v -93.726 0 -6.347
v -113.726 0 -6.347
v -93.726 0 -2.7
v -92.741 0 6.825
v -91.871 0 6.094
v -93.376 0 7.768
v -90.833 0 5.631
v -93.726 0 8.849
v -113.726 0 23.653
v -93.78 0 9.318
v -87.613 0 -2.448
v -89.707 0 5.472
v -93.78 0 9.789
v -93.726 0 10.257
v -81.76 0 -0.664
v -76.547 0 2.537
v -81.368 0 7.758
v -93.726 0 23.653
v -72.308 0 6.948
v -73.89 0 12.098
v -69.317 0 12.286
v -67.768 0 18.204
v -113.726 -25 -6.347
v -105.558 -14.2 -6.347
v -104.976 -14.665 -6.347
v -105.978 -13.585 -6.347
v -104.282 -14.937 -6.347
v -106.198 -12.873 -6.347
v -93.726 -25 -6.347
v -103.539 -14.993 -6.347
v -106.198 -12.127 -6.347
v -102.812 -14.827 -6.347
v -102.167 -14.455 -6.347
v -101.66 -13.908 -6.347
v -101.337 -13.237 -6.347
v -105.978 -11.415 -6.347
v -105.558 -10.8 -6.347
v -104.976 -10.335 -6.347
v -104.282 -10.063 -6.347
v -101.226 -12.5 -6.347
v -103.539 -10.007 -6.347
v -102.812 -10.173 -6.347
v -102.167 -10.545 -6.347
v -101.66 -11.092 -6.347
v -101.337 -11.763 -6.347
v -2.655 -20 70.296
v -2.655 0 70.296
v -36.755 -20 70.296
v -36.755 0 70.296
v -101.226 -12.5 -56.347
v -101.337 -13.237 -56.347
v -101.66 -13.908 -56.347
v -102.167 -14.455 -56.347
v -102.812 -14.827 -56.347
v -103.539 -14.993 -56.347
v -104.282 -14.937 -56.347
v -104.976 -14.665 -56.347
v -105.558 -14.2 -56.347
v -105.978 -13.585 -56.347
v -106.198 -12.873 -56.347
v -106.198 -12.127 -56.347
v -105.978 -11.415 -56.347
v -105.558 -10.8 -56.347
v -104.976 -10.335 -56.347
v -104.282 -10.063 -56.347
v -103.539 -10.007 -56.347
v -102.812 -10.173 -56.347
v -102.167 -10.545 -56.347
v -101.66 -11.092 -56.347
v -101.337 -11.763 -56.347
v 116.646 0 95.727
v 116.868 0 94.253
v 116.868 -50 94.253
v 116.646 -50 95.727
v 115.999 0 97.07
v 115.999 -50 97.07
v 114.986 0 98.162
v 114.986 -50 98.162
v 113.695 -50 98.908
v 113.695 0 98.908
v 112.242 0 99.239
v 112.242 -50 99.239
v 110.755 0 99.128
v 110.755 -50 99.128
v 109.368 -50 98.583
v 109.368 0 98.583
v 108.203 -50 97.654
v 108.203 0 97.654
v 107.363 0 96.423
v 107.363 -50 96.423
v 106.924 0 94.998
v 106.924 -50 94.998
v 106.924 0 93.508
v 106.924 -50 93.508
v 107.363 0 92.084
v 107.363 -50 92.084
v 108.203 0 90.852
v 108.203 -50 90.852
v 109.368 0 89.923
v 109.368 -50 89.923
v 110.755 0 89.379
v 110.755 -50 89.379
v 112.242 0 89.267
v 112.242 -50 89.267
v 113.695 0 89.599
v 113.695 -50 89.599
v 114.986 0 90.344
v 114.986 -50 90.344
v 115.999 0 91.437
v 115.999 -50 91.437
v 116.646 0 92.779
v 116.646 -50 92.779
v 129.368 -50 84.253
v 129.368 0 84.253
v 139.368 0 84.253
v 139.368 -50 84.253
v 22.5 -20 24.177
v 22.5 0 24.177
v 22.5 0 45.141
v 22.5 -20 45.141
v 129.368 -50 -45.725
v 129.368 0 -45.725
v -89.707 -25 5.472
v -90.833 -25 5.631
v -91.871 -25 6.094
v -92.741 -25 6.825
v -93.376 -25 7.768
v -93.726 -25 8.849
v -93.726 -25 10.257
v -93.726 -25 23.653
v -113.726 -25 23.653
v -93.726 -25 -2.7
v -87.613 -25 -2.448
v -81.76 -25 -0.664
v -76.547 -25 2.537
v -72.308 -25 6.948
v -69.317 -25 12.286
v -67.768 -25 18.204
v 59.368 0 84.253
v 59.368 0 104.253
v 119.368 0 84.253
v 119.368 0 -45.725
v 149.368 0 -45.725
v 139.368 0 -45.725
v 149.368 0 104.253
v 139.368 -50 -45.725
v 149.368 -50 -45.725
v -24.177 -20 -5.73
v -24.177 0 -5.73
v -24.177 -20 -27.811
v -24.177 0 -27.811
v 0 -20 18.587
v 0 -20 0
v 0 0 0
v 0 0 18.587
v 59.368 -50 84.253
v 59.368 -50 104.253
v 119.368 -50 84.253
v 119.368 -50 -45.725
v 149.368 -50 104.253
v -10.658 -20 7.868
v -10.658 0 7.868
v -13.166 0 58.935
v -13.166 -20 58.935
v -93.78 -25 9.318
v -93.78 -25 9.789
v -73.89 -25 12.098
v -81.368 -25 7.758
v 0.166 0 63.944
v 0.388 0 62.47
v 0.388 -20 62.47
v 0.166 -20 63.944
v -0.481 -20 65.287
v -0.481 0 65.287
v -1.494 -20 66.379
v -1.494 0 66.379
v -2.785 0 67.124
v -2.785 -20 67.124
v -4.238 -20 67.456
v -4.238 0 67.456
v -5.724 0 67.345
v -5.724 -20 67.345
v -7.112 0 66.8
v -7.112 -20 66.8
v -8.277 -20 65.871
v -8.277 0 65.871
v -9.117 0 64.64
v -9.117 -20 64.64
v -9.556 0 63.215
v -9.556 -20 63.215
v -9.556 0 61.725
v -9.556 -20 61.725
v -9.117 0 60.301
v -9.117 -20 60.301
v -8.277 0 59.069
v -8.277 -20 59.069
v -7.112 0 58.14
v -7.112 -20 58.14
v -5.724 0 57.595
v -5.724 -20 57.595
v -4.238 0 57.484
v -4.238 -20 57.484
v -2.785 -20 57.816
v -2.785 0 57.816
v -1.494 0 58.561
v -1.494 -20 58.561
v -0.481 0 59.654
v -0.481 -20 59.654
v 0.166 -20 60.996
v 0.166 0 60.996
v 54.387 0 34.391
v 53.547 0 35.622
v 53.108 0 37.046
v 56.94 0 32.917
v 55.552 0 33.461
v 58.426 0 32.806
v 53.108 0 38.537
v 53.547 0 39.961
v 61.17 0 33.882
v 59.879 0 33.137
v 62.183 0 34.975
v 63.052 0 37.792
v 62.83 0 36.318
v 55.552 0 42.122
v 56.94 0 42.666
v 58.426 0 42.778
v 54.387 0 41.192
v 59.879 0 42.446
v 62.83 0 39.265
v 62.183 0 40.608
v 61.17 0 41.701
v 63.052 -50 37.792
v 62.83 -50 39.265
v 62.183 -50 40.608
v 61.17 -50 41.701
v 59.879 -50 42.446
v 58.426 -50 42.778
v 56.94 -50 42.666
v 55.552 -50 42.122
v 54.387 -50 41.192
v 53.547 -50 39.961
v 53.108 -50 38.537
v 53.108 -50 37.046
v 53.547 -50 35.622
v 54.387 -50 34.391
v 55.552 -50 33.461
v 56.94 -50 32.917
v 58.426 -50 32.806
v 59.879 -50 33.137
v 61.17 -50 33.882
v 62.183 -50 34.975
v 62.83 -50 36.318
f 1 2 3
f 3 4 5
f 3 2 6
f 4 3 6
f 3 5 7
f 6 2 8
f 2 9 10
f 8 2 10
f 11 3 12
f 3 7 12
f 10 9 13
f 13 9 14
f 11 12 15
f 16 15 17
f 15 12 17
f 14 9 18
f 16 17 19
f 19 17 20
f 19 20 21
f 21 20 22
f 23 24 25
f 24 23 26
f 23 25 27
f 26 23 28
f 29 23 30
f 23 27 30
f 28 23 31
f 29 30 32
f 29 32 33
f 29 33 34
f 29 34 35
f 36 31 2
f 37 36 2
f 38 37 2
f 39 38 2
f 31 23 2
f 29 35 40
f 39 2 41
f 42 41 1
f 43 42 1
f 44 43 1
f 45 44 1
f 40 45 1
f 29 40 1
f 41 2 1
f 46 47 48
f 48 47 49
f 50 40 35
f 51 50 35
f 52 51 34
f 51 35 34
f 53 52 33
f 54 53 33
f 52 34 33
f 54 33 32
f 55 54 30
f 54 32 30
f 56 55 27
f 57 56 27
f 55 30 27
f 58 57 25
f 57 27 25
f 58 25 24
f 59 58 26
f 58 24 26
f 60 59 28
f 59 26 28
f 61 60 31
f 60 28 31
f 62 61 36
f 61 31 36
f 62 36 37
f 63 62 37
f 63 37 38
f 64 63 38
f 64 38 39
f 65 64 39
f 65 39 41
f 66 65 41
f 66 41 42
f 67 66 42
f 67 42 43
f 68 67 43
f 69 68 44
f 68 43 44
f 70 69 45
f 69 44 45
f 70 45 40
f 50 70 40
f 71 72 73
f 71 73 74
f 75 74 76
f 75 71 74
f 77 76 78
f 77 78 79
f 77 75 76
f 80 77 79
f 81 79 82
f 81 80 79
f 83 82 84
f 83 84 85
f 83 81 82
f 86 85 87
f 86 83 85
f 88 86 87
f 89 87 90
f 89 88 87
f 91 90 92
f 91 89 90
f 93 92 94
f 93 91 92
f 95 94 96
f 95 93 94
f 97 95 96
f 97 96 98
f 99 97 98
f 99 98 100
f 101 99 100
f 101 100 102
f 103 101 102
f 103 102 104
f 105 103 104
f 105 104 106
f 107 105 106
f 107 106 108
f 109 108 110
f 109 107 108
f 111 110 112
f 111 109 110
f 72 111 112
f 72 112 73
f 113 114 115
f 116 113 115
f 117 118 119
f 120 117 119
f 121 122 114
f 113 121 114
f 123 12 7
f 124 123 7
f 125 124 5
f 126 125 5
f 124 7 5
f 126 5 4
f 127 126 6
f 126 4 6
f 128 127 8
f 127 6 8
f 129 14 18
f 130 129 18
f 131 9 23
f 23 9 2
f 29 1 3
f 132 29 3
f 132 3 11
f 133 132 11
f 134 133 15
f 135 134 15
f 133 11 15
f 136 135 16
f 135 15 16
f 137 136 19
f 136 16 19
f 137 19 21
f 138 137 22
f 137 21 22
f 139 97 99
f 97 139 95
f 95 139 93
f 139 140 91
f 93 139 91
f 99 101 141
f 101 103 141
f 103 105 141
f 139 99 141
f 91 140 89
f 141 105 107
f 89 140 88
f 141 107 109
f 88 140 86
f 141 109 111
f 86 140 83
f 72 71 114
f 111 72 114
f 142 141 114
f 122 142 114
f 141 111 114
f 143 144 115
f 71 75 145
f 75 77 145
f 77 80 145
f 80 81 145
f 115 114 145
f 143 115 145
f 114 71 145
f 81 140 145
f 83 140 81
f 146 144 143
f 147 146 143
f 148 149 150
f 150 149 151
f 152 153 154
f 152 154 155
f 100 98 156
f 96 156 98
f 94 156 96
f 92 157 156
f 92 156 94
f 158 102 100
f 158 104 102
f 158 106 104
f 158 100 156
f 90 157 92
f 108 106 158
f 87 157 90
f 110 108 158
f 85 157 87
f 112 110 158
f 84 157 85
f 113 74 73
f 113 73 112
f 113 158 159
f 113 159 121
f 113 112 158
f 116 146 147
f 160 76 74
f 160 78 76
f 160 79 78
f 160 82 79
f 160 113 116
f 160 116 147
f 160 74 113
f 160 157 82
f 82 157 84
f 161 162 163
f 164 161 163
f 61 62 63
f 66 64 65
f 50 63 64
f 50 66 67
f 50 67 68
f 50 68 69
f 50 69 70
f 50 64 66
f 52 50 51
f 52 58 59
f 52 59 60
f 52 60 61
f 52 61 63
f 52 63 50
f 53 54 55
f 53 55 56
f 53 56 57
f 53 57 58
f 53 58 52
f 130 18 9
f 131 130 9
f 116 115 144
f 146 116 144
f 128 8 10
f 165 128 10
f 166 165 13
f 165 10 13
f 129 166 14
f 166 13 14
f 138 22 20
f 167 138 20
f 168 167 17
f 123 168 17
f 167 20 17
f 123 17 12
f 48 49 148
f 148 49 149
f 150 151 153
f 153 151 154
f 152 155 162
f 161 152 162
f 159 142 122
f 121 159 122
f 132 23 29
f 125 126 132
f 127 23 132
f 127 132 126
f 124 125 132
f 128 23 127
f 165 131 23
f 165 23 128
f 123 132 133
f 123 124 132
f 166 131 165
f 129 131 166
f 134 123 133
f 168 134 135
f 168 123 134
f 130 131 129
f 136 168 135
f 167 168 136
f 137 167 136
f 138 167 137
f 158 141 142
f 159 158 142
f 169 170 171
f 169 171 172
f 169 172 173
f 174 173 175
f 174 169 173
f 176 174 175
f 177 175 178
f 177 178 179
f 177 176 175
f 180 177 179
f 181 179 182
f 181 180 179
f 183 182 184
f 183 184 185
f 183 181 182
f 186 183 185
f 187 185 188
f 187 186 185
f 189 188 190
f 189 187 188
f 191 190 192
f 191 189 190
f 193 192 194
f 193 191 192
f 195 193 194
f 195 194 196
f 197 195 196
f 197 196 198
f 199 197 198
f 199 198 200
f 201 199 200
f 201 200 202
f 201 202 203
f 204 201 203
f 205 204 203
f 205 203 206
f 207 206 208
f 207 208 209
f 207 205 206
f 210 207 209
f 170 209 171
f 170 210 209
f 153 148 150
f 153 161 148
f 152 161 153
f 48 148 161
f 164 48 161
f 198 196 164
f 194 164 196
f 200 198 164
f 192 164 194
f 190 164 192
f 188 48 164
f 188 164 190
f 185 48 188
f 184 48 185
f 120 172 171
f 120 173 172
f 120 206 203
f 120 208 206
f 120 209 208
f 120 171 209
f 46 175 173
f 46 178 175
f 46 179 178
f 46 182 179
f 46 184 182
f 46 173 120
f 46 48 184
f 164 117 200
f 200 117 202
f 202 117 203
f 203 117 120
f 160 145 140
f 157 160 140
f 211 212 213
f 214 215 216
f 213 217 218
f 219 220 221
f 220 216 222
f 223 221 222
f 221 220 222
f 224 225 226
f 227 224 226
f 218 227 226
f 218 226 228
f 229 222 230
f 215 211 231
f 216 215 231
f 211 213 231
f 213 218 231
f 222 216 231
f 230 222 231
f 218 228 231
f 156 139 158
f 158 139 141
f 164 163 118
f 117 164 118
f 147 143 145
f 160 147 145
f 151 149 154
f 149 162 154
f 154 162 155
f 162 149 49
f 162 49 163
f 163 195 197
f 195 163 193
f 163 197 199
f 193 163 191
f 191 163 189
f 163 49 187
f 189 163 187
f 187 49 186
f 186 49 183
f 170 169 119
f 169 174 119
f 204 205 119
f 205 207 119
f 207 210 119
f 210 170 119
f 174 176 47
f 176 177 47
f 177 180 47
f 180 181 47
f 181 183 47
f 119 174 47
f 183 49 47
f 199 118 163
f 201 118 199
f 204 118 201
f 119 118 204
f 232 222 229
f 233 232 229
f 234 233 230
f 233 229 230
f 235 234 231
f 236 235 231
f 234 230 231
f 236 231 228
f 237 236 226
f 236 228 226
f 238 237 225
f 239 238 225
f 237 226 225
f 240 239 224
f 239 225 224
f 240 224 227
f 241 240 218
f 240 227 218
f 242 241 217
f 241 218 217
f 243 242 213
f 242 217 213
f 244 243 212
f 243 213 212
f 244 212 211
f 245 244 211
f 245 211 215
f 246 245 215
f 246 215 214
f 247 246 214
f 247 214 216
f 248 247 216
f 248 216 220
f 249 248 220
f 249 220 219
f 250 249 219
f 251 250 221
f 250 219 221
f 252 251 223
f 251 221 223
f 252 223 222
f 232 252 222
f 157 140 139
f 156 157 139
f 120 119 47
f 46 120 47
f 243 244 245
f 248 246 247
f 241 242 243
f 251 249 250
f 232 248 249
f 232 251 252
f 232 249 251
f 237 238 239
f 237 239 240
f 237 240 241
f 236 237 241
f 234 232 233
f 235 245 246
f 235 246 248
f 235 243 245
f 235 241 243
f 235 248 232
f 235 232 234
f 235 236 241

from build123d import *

# Parameters (mm, degrees)
F0_R     = 5
F1_DEPTH = 20
F2_DEPTH = 50
F3_DEPTH = 50
F4_DEPTH = 25
F5_R     = 2.5
F6_DEPTH = 50


with BuildPart() as f1:
    # F0 (on Front) → F1 (new body)
    with BuildSketch(Plane.XZ):
        Polygon((0, 0), (0, 18.587303), (-10.657682, 7.868015), (-13.166117, 58.935304), (22.500423, 24.17747), (22.500423, 45.140596), (-2.655328, 70.296347), (-36.755343, 70.296347), (-24.177468, -5.729921), (-24.177468, -27.811079), align=None)
        with Locations((-4.611884, 62.470106)):
            Circle(F0_R, mode=Mode.SUBTRACT)
    extrude(amount=F1_DEPTH)


with BuildPart() as f2:
    # F0 (on Front) → F2 (new body)
    with BuildSketch(Plane.XZ):
        with Locations((58.052182, 37.791558)):
            Circle(F0_R)
    extrude(amount=F2_DEPTH)


with BuildPart() as f3:
    # F0 (on Front) → F3 (new body)
    with BuildSketch(Plane.XZ):
        Polygon((119.368089, 84.25321), (119.368089, -45.724902), (129.368089, -45.724902), (129.368089, 84.25321), (139.368089, 84.25321), (139.368089, -45.724902), (149.368089, -45.724902), (149.368089, 104.25321), (119.368089, 104.25321), (59.368089, 104.25321), (59.368089, 84.25321), align=None)
        with Locations((111.868089, 94.25321)):
            Circle(F0_R, mode=Mode.SUBTRACT)
    extrude(amount=F3_DEPTH)


with BuildPart() as f4:
    # F0 (on Front) → F4 (new body)
    with BuildSketch(Plane.XZ):
        with BuildLine():
            Line((-93.725536, 13.428823), (-93.725536, 23.653466))
            Line((-93.725536, 23.653466), (-113.725536, 23.653466))
            Line((-113.725536, 23.653466), (-113.725536, -6.346534))
            Line((-113.725536, -6.346534), (-93.725536, -6.346534))
            Line((-93.725536, -6.346534), (-93.725536, -2.700388))
            ThreePointArc((-93.725536, -2.700388), (-76.546582, 2.536641), (-67.76756, 18.204179))
            ThreePointArc((-67.76756, 18.204179), (-77.48873, 9.686588), (-89.707051, 5.471954))
            ThreePointArc((-89.707051, 5.471954), (-92.331314, 6.428913), (-93.725536, 8.849383))
            ThreePointArc((-93.725536, 8.849383), (-93.786691, 9.553265), (-93.725536, 10.257147))
            Line((-93.725536, 10.257147), (-93.725536, 13.428823))
        make_face()
    extrude(amount=F4_DEPTH)

    # F5 (on face) → F6 (join)
    with BuildSketch(Plane(origin=(0, 0, -6.346534), x_dir=(1, 0, 0), z_dir=(0, 0, -1))):
        with Locations((-103.725536, 12.5)):
            Circle(F5_R)
    extrude(amount=F6_DEPTH)


solid = Compound([f1.part, f2.part, f3.part, f4.part])
